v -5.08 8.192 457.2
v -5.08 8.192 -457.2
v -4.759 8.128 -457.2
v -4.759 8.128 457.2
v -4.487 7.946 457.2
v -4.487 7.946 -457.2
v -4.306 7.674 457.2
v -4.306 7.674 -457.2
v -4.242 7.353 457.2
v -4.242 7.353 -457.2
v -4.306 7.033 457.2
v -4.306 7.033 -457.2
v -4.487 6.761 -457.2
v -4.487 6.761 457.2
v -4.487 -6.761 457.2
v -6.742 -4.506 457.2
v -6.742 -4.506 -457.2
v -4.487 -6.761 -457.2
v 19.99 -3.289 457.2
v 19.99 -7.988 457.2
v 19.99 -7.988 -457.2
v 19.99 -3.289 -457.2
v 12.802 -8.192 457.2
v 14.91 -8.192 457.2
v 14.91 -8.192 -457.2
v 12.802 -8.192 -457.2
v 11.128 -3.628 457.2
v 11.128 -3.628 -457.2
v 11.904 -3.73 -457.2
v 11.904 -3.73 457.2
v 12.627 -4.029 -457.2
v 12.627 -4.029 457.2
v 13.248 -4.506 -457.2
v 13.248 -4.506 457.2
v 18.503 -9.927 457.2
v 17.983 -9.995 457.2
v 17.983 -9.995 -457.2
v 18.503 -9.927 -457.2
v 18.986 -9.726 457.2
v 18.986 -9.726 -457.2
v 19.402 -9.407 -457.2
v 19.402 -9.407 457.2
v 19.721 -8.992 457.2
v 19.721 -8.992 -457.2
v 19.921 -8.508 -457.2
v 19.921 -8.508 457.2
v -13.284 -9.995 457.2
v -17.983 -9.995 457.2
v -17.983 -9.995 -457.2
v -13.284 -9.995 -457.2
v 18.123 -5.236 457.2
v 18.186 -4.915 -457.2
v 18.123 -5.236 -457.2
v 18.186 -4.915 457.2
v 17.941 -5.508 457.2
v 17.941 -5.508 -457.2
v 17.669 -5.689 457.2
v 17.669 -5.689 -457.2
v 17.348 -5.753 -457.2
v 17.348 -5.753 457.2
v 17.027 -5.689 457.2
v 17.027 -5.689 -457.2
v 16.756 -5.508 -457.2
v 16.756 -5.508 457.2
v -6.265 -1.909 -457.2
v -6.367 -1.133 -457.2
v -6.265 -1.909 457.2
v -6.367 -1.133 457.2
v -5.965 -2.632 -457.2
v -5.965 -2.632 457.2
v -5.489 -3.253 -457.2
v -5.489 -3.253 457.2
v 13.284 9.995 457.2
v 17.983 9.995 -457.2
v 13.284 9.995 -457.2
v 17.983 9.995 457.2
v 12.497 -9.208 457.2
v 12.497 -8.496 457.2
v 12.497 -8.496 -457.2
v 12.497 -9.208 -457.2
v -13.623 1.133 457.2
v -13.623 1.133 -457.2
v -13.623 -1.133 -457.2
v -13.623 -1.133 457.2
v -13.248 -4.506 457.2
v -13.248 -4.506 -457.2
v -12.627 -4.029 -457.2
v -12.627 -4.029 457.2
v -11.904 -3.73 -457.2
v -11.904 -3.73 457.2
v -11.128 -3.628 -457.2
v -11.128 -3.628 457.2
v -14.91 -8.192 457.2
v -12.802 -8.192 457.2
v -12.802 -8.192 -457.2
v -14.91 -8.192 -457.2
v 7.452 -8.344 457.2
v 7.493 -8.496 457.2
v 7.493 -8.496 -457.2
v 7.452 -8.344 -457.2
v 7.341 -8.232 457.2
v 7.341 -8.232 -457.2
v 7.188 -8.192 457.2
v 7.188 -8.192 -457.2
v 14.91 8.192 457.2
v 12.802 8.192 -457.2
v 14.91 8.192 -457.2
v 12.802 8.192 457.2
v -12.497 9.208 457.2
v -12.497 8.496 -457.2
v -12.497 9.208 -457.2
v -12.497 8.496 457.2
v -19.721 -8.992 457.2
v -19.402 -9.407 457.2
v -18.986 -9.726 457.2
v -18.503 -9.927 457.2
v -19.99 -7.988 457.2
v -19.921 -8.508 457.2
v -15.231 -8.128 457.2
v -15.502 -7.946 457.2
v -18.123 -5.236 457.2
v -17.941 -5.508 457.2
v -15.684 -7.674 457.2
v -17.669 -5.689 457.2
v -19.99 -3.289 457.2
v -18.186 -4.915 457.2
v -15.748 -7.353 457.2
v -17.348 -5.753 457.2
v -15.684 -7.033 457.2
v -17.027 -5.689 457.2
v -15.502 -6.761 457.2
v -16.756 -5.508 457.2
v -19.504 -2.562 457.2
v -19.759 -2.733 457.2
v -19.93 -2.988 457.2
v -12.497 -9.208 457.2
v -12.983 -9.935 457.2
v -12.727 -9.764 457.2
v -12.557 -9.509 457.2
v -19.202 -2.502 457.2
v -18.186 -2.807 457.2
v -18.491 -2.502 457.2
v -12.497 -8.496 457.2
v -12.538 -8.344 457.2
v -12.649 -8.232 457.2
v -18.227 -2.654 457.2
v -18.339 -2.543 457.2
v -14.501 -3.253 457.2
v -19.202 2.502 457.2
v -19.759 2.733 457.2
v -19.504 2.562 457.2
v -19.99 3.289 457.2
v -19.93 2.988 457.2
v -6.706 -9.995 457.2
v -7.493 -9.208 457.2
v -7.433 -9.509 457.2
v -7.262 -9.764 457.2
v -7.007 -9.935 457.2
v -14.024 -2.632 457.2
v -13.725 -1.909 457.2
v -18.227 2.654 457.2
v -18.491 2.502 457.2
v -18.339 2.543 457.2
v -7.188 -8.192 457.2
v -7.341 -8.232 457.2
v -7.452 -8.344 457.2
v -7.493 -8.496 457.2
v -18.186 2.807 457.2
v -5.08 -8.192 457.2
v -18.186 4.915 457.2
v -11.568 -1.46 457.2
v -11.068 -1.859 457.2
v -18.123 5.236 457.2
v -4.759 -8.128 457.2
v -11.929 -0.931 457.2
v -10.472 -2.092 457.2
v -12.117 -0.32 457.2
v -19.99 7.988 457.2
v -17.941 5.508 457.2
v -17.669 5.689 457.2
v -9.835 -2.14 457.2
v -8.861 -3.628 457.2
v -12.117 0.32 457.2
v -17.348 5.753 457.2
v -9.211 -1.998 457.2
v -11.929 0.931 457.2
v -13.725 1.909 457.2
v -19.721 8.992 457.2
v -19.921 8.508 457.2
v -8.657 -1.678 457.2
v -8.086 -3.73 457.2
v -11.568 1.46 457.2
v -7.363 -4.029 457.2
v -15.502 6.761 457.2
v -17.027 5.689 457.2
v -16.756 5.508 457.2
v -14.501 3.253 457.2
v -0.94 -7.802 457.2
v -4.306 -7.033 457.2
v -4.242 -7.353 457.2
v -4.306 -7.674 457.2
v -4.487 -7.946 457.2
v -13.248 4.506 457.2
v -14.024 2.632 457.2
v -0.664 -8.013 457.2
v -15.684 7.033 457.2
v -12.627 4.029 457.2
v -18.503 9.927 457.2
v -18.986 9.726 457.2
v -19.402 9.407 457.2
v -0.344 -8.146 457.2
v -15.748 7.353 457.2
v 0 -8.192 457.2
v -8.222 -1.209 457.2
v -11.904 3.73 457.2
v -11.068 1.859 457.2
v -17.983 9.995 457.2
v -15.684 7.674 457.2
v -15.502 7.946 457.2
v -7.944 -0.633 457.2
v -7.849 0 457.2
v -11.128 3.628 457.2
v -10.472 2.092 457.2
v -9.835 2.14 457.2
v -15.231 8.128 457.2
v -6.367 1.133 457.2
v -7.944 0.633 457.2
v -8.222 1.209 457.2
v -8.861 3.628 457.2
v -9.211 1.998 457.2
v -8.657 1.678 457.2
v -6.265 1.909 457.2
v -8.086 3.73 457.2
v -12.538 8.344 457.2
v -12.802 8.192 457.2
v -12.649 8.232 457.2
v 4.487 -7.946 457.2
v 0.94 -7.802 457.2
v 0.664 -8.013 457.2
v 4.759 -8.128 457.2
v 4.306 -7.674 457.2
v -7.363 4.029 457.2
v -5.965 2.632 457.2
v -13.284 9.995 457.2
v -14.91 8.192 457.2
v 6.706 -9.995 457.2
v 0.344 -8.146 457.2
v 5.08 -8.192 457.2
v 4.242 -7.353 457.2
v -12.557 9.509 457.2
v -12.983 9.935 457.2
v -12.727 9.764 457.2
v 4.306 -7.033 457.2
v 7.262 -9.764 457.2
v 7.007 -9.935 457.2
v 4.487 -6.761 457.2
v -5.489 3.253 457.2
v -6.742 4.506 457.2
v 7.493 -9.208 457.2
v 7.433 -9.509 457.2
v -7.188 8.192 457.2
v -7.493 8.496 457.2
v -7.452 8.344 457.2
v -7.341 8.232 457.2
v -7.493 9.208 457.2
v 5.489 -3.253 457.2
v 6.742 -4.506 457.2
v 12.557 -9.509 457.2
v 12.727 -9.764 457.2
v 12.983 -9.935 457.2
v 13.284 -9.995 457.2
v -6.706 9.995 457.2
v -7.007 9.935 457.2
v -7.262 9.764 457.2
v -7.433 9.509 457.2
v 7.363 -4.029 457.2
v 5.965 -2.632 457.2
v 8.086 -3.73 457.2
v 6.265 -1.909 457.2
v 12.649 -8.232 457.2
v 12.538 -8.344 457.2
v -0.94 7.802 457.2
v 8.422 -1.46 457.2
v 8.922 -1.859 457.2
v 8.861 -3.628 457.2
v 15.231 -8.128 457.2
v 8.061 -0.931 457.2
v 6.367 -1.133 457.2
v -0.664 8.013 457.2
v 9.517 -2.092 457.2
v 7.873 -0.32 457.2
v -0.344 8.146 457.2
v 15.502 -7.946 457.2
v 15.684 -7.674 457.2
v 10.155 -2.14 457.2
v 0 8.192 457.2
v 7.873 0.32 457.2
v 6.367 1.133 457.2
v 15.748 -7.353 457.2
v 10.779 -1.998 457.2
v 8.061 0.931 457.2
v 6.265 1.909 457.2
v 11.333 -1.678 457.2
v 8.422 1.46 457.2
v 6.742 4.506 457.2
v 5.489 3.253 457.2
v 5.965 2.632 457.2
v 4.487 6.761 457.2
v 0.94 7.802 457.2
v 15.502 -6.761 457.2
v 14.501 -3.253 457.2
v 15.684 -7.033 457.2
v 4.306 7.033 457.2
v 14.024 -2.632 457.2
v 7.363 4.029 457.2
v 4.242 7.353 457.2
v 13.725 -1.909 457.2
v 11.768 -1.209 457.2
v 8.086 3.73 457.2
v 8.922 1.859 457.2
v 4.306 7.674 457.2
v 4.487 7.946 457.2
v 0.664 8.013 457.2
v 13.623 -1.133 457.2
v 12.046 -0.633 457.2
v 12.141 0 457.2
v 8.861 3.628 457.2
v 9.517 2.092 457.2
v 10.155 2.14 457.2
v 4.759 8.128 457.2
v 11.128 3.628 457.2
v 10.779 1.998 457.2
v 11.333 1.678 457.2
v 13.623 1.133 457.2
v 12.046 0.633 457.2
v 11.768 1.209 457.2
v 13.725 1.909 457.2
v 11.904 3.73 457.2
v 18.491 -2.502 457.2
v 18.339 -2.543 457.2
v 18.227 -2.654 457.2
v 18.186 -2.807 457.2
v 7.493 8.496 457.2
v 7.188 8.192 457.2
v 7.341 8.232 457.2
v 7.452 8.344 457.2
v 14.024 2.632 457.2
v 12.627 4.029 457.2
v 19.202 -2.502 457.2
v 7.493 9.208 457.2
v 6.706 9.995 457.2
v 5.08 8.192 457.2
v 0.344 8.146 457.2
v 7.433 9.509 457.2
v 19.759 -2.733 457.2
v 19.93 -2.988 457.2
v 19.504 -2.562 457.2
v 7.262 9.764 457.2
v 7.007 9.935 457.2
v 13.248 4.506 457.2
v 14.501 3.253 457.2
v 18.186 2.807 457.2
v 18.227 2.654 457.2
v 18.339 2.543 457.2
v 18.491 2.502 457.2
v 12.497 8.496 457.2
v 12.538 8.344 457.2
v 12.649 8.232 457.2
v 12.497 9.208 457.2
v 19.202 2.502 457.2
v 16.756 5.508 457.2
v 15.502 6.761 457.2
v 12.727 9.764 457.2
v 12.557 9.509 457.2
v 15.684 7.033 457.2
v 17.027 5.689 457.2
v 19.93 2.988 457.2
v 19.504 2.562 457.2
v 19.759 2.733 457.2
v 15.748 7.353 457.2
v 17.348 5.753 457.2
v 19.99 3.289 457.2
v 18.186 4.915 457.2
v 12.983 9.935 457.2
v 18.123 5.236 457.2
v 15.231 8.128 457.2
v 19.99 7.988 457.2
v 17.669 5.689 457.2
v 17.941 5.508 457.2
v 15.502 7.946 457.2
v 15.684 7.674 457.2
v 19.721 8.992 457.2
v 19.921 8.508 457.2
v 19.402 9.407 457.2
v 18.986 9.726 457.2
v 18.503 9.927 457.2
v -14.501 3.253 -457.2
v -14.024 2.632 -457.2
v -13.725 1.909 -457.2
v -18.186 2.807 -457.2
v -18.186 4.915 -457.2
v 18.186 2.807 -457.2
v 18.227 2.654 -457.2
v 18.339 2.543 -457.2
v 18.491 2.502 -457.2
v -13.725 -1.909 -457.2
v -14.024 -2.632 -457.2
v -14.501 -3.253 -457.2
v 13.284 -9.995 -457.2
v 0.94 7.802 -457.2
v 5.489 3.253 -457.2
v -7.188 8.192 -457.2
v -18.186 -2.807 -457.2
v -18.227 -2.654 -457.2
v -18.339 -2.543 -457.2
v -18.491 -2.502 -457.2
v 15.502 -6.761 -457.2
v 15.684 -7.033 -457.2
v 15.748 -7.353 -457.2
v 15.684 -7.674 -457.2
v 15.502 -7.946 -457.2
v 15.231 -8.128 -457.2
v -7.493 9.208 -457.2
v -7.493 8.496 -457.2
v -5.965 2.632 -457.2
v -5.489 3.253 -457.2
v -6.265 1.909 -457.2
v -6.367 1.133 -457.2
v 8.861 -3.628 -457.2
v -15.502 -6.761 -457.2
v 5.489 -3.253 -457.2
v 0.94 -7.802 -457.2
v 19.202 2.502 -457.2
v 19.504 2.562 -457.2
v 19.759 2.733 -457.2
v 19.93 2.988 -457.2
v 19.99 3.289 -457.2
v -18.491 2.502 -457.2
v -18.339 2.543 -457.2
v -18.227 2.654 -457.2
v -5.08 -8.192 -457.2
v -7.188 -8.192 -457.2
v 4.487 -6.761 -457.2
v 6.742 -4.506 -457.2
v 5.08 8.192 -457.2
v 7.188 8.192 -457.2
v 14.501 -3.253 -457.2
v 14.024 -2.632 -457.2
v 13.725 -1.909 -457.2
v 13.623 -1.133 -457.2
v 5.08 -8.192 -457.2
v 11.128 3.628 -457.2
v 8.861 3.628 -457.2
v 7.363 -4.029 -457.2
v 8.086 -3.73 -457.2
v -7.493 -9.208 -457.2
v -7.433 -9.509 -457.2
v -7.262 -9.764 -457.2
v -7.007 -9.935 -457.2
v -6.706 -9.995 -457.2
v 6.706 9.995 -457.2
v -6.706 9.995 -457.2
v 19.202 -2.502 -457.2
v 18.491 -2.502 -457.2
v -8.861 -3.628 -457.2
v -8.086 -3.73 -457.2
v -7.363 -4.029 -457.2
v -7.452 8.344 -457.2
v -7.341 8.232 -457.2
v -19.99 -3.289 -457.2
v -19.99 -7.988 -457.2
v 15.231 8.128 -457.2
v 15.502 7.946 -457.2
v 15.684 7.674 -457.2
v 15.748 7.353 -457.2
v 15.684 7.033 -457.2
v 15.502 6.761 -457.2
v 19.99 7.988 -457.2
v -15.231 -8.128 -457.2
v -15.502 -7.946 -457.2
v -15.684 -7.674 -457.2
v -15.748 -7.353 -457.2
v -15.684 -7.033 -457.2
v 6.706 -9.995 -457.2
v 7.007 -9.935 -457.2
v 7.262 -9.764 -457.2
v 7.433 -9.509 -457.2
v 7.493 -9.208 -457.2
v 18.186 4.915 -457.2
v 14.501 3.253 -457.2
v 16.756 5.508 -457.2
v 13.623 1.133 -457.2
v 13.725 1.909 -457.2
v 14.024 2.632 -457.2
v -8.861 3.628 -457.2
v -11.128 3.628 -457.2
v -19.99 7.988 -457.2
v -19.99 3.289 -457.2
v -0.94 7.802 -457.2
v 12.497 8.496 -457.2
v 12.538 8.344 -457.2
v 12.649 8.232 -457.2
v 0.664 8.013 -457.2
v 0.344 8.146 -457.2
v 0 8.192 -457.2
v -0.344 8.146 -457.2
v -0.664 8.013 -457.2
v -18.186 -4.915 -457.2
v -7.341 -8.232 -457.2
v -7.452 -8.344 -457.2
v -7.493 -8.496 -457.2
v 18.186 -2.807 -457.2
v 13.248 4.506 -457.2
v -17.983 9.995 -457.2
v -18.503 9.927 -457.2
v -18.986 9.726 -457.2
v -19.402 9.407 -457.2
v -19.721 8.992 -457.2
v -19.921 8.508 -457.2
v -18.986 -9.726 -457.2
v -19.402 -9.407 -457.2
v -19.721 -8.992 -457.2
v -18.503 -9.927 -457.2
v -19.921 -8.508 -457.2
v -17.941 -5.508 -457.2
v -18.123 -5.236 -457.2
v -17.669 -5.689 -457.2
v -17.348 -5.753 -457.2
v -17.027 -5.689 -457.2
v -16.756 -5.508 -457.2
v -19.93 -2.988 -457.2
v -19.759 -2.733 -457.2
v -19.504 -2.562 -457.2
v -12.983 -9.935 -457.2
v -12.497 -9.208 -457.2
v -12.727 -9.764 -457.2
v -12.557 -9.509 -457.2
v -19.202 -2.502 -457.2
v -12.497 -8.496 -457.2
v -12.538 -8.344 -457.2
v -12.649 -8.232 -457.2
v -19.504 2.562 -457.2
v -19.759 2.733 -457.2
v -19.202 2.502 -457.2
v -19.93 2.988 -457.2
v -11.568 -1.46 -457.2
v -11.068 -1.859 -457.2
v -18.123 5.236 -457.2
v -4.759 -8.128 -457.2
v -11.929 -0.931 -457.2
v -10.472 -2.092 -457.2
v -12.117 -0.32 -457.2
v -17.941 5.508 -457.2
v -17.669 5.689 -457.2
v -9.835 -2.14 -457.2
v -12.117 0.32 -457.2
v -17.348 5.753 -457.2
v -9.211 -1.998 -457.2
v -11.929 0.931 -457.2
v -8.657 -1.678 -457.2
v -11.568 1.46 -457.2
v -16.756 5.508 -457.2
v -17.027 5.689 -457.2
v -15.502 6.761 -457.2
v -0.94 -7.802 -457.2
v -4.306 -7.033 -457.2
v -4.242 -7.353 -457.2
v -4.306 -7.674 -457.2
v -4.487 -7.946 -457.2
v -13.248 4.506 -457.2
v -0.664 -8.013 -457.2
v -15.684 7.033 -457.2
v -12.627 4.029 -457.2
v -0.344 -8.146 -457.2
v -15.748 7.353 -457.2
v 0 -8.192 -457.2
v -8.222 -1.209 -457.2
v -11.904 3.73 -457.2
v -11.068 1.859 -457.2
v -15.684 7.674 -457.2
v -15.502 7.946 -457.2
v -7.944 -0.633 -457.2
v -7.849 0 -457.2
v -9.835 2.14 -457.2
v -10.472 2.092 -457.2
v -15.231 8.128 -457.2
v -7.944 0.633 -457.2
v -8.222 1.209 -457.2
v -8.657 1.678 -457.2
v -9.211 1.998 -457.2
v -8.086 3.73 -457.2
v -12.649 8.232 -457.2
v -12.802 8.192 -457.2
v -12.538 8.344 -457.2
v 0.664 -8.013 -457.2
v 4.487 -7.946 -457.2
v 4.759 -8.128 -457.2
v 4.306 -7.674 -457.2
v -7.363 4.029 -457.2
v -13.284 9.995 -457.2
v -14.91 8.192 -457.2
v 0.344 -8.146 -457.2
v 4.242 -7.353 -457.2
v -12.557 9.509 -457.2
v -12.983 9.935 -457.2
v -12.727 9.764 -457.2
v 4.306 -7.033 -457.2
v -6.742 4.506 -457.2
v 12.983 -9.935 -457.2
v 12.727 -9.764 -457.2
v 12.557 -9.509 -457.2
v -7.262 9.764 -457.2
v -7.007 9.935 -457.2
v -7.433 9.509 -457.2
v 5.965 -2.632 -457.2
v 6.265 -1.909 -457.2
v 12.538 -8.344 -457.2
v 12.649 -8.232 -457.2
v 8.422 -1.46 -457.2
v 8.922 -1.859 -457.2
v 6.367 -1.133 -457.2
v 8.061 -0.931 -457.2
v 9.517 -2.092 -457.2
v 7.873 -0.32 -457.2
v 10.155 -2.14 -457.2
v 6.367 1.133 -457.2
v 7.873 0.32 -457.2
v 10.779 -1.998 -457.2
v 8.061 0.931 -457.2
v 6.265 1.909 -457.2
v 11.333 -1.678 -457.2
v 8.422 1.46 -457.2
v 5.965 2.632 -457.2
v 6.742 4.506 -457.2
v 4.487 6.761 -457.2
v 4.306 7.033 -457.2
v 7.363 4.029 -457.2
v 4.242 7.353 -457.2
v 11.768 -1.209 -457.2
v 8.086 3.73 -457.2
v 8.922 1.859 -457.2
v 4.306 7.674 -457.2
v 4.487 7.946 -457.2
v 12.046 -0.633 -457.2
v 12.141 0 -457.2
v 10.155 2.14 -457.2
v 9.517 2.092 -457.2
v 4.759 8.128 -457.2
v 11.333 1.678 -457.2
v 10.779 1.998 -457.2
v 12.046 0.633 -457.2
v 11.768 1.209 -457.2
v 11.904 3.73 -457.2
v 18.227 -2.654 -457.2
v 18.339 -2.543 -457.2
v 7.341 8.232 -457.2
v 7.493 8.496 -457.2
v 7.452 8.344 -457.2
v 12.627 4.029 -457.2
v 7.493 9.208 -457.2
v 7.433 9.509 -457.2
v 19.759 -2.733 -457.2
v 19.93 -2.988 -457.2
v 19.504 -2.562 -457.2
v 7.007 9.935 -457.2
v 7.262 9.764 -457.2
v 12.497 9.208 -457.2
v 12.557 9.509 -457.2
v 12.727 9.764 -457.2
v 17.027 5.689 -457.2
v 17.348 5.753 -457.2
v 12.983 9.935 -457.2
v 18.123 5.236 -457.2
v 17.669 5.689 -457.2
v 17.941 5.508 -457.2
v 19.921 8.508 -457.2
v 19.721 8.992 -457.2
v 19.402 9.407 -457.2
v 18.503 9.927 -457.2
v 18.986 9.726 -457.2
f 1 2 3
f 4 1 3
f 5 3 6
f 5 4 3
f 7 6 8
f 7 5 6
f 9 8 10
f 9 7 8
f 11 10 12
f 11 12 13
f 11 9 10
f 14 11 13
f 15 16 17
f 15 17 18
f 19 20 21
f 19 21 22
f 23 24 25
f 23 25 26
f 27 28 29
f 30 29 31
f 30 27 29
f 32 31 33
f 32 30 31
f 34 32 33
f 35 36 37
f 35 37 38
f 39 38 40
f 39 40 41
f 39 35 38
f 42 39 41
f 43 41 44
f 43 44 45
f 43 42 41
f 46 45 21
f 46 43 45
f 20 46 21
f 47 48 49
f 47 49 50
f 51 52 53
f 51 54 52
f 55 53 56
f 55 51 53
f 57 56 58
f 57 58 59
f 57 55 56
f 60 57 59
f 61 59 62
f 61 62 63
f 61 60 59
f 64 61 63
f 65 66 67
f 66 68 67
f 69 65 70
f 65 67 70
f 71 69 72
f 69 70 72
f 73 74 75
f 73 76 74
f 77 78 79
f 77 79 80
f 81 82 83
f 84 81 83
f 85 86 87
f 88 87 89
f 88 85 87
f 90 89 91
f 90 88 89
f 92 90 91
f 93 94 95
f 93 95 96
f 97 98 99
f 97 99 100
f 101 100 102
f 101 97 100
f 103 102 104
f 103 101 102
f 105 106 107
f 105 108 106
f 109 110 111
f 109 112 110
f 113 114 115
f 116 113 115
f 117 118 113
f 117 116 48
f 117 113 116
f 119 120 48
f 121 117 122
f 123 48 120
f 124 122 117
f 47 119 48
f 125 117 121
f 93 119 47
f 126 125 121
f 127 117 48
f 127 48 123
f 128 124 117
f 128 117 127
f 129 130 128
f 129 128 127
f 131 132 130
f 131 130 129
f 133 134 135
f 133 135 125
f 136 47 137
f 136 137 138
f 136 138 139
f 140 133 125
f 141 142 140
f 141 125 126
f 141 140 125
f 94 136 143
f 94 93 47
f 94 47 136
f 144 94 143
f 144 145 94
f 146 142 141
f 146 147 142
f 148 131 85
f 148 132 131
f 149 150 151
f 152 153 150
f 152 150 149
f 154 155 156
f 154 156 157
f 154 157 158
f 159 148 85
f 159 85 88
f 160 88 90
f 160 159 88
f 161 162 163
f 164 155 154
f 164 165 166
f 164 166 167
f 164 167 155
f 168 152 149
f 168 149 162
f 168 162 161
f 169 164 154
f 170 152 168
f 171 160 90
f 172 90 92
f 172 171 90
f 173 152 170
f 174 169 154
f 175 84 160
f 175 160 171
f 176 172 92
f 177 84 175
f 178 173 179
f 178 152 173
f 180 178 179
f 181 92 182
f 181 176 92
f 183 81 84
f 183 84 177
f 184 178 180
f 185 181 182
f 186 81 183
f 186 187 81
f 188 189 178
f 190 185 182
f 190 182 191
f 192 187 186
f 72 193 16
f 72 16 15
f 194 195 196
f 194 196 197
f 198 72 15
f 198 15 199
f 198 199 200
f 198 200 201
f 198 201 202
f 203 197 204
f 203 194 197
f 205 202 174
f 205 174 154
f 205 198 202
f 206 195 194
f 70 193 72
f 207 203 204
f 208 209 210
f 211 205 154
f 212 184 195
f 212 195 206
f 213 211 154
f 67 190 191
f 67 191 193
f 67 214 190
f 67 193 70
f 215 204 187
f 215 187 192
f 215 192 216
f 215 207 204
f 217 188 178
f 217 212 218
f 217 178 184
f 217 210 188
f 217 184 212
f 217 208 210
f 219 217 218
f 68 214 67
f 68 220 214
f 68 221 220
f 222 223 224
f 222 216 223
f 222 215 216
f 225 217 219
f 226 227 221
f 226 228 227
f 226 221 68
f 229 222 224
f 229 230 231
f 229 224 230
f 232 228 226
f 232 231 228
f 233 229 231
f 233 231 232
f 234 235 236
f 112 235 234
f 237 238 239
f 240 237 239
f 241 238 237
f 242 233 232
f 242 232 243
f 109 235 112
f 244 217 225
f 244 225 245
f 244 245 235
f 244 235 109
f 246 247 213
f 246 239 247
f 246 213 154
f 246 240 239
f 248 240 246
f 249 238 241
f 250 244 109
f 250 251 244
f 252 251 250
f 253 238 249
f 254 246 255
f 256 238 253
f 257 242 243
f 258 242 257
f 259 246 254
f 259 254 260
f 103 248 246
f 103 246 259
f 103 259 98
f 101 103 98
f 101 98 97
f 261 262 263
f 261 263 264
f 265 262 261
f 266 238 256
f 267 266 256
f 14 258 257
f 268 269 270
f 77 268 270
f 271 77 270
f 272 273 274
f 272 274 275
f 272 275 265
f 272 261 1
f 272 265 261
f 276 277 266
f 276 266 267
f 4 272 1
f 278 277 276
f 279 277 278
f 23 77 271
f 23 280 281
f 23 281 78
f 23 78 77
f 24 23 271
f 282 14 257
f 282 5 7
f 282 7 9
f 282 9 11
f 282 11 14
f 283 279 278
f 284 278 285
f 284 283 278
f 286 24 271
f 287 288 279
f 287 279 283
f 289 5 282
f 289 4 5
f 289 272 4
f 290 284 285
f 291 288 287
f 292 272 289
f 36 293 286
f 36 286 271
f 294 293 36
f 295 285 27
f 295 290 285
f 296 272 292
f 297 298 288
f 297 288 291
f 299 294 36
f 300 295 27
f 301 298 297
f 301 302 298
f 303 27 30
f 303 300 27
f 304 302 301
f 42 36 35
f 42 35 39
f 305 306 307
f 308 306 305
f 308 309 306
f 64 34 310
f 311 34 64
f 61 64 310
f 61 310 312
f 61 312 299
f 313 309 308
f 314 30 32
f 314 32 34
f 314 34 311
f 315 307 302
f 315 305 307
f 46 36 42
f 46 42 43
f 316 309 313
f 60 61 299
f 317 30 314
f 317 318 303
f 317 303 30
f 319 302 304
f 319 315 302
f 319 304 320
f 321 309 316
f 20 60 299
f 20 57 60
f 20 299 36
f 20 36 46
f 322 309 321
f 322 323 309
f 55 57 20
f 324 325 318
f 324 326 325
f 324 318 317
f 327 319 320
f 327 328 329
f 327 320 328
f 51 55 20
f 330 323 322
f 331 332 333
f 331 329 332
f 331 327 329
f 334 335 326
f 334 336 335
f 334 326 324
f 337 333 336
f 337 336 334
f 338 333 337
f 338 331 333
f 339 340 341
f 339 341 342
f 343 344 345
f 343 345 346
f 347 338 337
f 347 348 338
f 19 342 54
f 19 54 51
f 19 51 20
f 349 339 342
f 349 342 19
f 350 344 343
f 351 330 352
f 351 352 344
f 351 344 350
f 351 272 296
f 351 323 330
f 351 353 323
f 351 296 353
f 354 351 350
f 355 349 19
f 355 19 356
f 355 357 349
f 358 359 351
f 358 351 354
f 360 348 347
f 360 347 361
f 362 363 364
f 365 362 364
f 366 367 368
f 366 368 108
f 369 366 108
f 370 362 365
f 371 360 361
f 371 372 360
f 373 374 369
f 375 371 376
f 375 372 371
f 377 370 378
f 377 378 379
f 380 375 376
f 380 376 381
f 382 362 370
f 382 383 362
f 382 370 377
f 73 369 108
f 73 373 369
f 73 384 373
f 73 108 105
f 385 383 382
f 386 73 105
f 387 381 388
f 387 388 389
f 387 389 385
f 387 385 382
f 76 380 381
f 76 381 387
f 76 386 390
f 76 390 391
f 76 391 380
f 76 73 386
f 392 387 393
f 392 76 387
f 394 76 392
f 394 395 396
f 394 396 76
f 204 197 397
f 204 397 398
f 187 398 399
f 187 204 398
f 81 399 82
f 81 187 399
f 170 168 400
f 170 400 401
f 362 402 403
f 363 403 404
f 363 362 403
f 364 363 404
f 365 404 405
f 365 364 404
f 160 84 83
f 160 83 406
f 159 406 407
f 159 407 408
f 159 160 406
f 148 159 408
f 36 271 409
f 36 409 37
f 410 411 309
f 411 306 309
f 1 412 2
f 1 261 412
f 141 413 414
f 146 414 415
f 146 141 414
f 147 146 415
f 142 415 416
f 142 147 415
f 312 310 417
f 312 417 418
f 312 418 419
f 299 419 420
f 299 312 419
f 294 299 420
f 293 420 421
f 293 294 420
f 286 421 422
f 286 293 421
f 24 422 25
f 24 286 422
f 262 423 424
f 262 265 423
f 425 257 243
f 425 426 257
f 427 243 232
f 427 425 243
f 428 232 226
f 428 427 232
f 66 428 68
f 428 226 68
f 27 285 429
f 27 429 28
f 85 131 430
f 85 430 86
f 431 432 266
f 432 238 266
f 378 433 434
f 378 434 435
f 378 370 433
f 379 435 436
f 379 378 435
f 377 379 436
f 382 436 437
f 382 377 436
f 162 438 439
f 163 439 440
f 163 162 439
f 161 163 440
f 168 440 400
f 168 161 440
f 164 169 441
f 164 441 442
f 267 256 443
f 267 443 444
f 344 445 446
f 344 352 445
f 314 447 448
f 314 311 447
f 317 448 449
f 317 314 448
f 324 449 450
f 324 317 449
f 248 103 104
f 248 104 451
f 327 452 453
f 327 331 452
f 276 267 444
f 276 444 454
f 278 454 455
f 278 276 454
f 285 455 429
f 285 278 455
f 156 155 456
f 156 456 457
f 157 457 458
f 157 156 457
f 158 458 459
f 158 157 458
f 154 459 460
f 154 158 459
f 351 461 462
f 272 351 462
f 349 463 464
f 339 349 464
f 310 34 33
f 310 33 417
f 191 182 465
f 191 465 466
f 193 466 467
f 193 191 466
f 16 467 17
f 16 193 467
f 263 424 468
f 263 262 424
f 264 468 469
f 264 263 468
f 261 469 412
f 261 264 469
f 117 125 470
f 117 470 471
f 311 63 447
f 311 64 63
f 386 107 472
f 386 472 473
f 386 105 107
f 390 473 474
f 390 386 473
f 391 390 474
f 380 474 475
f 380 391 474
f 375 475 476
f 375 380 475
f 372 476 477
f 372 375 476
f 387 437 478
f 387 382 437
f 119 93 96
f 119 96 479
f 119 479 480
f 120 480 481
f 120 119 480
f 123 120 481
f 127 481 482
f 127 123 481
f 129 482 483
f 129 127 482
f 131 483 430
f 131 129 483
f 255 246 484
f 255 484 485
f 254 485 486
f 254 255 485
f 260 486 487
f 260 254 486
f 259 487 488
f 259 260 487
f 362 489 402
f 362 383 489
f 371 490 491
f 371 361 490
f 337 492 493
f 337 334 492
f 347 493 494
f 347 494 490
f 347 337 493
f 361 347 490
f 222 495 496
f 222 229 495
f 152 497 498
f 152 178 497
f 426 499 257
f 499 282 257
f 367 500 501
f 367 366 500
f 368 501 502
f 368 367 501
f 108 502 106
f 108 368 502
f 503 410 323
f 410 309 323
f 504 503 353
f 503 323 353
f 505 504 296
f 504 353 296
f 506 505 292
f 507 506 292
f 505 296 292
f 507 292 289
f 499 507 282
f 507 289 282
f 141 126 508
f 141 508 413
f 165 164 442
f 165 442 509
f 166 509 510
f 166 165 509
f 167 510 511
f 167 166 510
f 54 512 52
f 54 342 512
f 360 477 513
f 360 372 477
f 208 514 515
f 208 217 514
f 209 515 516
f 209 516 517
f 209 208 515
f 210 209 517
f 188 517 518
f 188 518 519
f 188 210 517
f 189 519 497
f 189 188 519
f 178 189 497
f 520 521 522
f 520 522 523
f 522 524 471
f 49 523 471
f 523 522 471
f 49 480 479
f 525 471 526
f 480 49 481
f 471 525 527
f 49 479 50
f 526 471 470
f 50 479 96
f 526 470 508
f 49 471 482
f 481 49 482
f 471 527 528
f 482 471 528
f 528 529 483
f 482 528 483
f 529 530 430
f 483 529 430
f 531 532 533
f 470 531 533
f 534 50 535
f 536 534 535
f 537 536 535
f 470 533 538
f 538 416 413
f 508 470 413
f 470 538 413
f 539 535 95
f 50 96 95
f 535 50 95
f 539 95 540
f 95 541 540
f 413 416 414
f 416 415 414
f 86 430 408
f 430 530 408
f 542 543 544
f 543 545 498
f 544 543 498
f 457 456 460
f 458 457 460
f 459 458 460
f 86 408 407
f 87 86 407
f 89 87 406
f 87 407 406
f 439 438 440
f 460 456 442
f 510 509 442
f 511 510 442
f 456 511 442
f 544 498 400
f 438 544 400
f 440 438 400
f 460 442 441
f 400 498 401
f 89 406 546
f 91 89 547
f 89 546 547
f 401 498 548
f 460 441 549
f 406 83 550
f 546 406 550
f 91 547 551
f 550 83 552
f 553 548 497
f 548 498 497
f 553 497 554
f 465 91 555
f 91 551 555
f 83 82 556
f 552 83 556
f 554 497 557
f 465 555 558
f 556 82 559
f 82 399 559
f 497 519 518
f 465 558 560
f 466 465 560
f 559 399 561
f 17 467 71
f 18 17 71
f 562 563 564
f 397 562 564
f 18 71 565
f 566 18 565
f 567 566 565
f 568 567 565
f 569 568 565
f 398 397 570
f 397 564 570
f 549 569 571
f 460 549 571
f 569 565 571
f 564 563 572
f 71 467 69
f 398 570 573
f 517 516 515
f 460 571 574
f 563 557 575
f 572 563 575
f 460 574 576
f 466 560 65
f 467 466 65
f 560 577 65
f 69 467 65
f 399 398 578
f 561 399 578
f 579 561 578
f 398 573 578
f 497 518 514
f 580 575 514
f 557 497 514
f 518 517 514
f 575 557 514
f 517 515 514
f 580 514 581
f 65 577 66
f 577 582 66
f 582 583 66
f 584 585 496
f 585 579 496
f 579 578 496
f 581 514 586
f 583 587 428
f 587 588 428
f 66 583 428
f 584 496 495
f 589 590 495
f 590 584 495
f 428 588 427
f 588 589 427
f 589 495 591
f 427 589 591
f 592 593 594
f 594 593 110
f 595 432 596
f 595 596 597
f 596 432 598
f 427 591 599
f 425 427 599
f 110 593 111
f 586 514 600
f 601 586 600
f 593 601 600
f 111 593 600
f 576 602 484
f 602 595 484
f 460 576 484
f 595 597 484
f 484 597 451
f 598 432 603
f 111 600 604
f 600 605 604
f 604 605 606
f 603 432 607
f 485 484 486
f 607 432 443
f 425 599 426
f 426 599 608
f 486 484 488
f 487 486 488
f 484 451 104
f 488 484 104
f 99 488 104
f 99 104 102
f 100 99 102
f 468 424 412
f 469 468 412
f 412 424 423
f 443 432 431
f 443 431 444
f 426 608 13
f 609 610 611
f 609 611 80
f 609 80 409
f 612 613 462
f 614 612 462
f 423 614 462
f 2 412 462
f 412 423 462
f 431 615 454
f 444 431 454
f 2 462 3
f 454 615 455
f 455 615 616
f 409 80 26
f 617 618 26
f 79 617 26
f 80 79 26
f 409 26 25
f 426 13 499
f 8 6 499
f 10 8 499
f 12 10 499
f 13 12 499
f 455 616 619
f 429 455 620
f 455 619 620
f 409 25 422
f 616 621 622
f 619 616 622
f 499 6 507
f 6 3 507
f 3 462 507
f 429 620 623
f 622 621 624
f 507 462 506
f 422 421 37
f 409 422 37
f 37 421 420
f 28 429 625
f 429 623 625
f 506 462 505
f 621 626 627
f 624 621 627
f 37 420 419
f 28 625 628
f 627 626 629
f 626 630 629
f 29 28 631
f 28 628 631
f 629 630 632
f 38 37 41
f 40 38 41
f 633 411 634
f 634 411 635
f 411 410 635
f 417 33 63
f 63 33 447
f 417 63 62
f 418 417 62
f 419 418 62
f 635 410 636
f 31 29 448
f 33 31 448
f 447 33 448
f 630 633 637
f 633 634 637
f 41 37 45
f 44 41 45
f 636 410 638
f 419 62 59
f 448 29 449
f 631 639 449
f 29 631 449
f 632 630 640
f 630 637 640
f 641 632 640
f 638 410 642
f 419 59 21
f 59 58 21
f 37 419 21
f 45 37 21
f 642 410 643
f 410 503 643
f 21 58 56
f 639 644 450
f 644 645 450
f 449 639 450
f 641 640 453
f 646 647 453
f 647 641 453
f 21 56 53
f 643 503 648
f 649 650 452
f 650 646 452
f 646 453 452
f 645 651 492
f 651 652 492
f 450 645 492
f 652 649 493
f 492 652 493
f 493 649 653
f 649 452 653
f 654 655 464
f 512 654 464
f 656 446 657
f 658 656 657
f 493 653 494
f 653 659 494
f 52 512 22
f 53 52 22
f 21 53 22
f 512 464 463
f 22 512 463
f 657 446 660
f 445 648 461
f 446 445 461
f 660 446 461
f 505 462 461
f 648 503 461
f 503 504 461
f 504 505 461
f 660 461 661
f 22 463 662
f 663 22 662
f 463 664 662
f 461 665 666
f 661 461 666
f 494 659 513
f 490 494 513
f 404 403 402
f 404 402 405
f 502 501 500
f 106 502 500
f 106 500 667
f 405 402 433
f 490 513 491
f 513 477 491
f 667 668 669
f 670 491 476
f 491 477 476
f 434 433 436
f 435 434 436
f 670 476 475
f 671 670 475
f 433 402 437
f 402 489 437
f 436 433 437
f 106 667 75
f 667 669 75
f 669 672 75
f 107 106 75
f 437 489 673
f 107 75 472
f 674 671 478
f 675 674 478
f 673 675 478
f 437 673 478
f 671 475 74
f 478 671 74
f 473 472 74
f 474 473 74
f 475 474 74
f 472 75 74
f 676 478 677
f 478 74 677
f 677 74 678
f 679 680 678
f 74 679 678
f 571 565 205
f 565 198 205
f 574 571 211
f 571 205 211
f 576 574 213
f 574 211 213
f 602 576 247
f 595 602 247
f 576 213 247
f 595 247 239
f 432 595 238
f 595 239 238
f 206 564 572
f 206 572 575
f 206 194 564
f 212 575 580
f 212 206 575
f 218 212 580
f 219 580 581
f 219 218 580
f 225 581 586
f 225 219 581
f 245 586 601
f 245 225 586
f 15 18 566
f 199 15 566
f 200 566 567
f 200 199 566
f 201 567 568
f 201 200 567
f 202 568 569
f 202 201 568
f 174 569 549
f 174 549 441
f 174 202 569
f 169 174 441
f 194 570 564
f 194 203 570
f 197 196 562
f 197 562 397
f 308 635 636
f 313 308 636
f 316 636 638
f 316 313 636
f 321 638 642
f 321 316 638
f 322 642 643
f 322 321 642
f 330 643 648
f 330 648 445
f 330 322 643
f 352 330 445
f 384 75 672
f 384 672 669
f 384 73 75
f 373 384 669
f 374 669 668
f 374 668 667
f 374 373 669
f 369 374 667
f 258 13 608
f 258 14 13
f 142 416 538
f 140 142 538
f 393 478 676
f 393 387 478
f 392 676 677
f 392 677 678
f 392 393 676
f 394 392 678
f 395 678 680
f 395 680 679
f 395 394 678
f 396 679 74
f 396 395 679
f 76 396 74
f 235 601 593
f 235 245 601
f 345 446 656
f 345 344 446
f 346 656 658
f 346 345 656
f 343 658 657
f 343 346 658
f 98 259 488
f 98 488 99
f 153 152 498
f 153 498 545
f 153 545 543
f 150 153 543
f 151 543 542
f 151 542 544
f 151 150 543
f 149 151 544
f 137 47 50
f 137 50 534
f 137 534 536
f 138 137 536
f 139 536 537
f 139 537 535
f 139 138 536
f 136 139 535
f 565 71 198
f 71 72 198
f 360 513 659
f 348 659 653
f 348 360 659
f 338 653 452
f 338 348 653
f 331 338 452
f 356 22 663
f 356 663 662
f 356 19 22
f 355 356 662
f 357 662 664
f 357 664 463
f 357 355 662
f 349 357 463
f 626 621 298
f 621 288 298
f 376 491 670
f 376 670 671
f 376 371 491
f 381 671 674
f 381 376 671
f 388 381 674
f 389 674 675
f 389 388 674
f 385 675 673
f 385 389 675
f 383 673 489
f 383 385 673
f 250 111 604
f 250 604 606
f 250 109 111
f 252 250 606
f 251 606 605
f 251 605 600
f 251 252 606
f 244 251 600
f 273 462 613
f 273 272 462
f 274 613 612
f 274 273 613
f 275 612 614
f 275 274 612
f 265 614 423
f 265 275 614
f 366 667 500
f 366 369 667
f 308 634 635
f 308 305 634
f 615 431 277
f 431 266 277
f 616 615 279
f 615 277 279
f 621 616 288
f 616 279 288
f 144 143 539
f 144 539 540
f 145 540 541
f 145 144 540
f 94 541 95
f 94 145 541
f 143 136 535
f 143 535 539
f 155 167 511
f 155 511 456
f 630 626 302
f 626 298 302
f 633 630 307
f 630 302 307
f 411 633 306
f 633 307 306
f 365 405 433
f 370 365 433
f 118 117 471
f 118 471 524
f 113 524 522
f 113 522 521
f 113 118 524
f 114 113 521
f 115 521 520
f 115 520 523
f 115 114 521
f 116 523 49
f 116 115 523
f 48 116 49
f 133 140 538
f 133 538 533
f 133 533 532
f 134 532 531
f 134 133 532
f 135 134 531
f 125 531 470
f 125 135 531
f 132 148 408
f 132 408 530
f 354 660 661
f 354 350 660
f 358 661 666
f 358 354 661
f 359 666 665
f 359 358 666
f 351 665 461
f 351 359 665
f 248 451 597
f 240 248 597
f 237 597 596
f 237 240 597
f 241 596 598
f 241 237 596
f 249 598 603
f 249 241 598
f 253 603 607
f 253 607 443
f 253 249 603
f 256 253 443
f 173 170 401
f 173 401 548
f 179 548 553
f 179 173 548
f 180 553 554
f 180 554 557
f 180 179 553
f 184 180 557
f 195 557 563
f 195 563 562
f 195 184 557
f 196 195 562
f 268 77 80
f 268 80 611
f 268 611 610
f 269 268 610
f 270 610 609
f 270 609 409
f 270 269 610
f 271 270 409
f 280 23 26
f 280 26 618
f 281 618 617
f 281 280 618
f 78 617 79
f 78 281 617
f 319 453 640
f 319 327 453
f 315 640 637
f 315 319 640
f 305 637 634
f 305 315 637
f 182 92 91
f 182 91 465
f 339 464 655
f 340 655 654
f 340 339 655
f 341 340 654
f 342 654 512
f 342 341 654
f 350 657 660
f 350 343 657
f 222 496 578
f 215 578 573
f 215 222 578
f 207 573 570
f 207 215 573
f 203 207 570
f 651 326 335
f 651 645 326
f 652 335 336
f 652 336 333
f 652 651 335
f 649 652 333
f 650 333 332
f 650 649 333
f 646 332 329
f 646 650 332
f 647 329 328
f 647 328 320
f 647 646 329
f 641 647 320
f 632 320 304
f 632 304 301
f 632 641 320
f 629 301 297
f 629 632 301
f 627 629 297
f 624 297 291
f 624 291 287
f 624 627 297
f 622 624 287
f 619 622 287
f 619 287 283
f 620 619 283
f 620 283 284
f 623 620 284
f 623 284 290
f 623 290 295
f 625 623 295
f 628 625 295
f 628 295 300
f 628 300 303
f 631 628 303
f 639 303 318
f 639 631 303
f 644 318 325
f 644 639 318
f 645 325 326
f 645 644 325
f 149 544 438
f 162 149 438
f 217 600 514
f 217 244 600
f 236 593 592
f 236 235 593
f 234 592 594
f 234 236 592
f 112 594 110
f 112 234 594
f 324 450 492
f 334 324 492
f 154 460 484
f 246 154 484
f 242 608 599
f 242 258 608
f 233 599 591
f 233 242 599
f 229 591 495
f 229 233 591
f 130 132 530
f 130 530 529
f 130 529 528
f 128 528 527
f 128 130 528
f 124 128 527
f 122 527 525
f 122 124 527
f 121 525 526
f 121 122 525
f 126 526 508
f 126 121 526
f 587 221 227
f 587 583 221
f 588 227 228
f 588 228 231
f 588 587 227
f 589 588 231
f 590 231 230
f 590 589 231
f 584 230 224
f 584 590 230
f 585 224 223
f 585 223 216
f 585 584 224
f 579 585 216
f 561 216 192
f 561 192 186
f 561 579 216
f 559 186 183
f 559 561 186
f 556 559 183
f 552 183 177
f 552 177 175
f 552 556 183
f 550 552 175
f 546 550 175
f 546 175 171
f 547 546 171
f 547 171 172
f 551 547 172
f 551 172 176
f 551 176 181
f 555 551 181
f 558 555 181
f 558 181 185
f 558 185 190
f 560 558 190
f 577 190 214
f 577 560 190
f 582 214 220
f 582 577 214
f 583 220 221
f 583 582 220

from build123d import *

# Parameters (mm, degrees)
SKETCH1_R           = 2.1463
BOSS_EXTRUDE1_DEPTH = 457.2


with BuildPart() as part:
    # Sketch1 → Boss-Extrude1 (new body, symmetric)
    with BuildSketch(Plane.XY):
        with BuildLine():
            Line((-19.9898, 7.9883), (-19.9898, 3.2893))
            ThreePointArc((-19.9898, 3.2893), (-19.75917588, 2.73252412), (-19.2024, 2.5019))
            Line((-19.2024, 2.5019), (-18.4912, 2.5019))
            ThreePointArc((-18.4912, 2.5019), (-18.275673853, 2.591173853), (-18.1864, 2.8067))
            Line((-18.1864, 2.8067), (-18.1864, 4.9149))
            ThreePointArc((-18.1864, 4.9149), (-17.668965253, 5.689295824), (-16.755503096, 5.507596904))
            Line((-16.755503096, 5.507596904), (-14.500665747, 3.252759555))
            ThreePointArc((-14.500665747, 3.252759555), (-13.850954457, 2.280397894), (-13.622806192, 1.133419111))
            Line((-13.622806192, 1.133419111), (-13.622806192, -1.133419111))
            ThreePointArc((-13.622806192, -1.133419111), (-13.850954457, -2.280397894), (-14.500665747, -3.252759555))
            Line((-14.500665747, -3.252759555), (-16.755503096, -5.507596904))
            ThreePointArc((-16.755503096, -5.507596904), (-17.668965253, -5.689295824), (-18.1864, -4.9149))
            Line((-18.1864, -4.9149), (-18.1864, -2.8067))
            ThreePointArc((-18.1864, -2.8067), (-18.275673853, -2.591173853), (-18.4912, -2.5019))
            Line((-18.4912, -2.5019), (-19.2024, -2.5019))
            ThreePointArc((-19.2024, -2.5019), (-19.75917588, -2.73252412), (-19.9898, -3.2893))
            Line((-19.9898, -3.2893), (-19.9898, -7.9883))
            ThreePointArc((-19.9898, -7.9883), (-19.402080467, -9.407180467), (-17.9832, -9.9949))
            Line((-17.9832, -9.9949), (-13.2842, -9.9949))
            ThreePointArc((-13.2842, -9.9949), (-12.72742412, -9.76427588), (-12.4968, -9.2075))
            Line((-12.4968, -9.2075), (-12.4968, -8.4963))
            ThreePointArc((-12.4968, -8.4963), (-12.586073853, -8.280773853), (-12.8016, -8.1915))
            Line((-12.8016, -8.1915), (-14.9098, -8.1915))
            ThreePointArc((-14.9098, -8.1915), (-15.684195824, -7.674065253), (-15.502496904, -6.760603096))
            Line((-15.502496904, -6.760603096), (-13.247659555, -4.505765747))
            ThreePointArc((-13.247659555, -4.505765747), (-12.275297894, -3.856054457), (-11.128319111, -3.627906192))
            Line((-11.128319111, -3.627906192), (-8.861480889, -3.627906192))
            ThreePointArc((-8.861480889, -3.627906192), (-7.714502106, -3.856054457), (-6.742140445, -4.505765747))
            Line((-6.742140445, -4.505765747), (-4.487303096, -6.760603096))
            ThreePointArc((-4.487303096, -6.760603096), (-4.305604176, -7.674065253), (-5.08, -8.1915))
            Line((-5.08, -8.1915), (-7.1882, -8.1915))
            ThreePointArc((-7.1882, -8.1915), (-7.403726147, -8.280773853), (-7.493, -8.4963))
            Line((-7.493, -8.4963), (-7.493, -9.2075))
            ThreePointArc((-7.493, -9.2075), (-7.26237588, -9.76427588), (-6.7056, -9.9949))
            Line((-6.7056, -9.9949), (0, -9.9949))
            Line((0, -9.9949), (6.7056, -9.9949))
            ThreePointArc((6.7056, -9.9949), (7.26237588, -9.76427588), (7.493, -9.2075))
            Line((7.493, -9.2075), (7.493, -8.4963))
            ThreePointArc((7.493, -8.4963), (7.403726147, -8.280773853), (7.1882, -8.1915))
            Line((7.1882, -8.1915), (5.08, -8.1915))
            ThreePointArc((5.08, -8.1915), (4.305604176, -7.674065253), (4.487303096, -6.760603096))
            Line((4.487303096, -6.760603096), (6.742140445, -4.505765747))
            ThreePointArc((6.742140445, -4.505765747), (7.714502106, -3.856054457), (8.861480889, -3.627906192))
            Line((8.861480889, -3.627906192), (11.128319111, -3.627906192))
            ThreePointArc((11.128319111, -3.627906192), (12.275297894, -3.856054457), (13.247659555, -4.505765747))
            Line((13.247659555, -4.505765747), (15.502496904, -6.760603096))
            ThreePointArc((15.502496904, -6.760603096), (15.684195824, -7.674065253), (14.9098, -8.1915))
            Line((14.9098, -8.1915), (12.8016, -8.1915))
            ThreePointArc((12.8016, -8.1915), (12.586073853, -8.280773853), (12.4968, -8.4963))
            Line((12.4968, -8.4963), (12.4968, -9.2075))
            ThreePointArc((12.4968, -9.2075), (12.72742412, -9.76427588), (13.2842, -9.9949))
            Line((13.2842, -9.9949), (17.9832, -9.9949))
            ThreePointArc((17.9832, -9.9949), (19.402080467, -9.407180467), (19.9898, -7.9883))
            Line((19.9898, -7.9883), (19.9898, -3.2893))
            ThreePointArc((19.9898, -3.2893), (19.75917588, -2.73252412), (19.2024, -2.5019))
            Line((19.2024, -2.5019), (18.4912, -2.5019))
            ThreePointArc((18.4912, -2.5019), (18.275673853, -2.591173853), (18.1864, -2.8067))
            Line((18.1864, -2.8067), (18.1864, -4.9149))
            ThreePointArc((18.1864, -4.9149), (17.668965253, -5.689295824), (16.755503096, -5.507596904))
            Line((16.755503096, -5.507596904), (14.500665747, -3.252759555))
            ThreePointArc((14.500665747, -3.252759555), (13.850954457, -2.280397894), (13.622806192, -1.133419111))
            Line((13.622806192, -1.133419111), (13.622806192, 1.133419111))
            ThreePointArc((13.622806192, 1.133419111), (13.850954457, 2.280397894), (14.500665747, 3.252759555))
            Line((14.500665747, 3.252759555), (16.755503096, 5.507596904))
            ThreePointArc((16.755503096, 5.507596904), (17.668965253, 5.689295824), (18.1864, 4.9149))
            Line((18.1864, 4.9149), (18.1864, 2.8067))
            ThreePointArc((18.1864, 2.8067), (18.275673853, 2.591173853), (18.4912, 2.5019))
            Line((18.4912, 2.5019), (19.2024, 2.5019))
            ThreePointArc((19.2024, 2.5019), (19.75917588, 2.73252412), (19.9898, 3.2893))
            Line((19.9898, 3.2893), (19.9898, 7.9883))
            ThreePointArc((19.9898, 7.9883), (19.402080467, 9.407180467), (17.9832, 9.9949))
            Line((17.9832, 9.9949), (13.2842, 9.9949))
            ThreePointArc((13.2842, 9.9949), (12.72742412, 9.76427588), (12.4968, 9.2075))
            Line((12.4968, 9.2075), (12.4968, 8.4963))
            ThreePointArc((12.4968, 8.4963), (12.586073853, 8.280773853), (12.8016, 8.1915))
            Line((12.8016, 8.1915), (14.9098, 8.1915))
            ThreePointArc((14.9098, 8.1915), (15.684195824, 7.674065253), (15.502496904, 6.760603096))
            Line((15.502496904, 6.760603096), (13.247659555, 4.505765747))
            ThreePointArc((13.247659555, 4.505765747), (12.275297894, 3.856054457), (11.128319111, 3.627906192))
            Line((11.128319111, 3.627906192), (8.861480889, 3.627906192))
            ThreePointArc((8.861480889, 3.627906192), (7.714502106, 3.856054457), (6.742140445, 4.505765747))
            Line((6.742140445, 4.505765747), (4.487303096, 6.760603096))
            ThreePointArc((4.487303096, 6.760603096), (4.305604176, 7.674065253), (5.08, 8.1915))
            Line((5.08, 8.1915), (7.1882, 8.1915))
            ThreePointArc((7.1882, 8.1915), (7.403726147, 8.280773853), (7.493, 8.4963))
            Line((7.493, 8.4963), (7.493, 9.2075))
            ThreePointArc((7.493, 9.2075), (7.26237588, 9.76427588), (6.7056, 9.9949))
            Line((6.7056, 9.9949), (0, 9.9949))
            Line((0, 9.9949), (-6.7056, 9.9949))
            ThreePointArc((-6.7056, 9.9949), (-7.26237588, 9.76427588), (-7.493, 9.2075))
            Line((-7.493, 9.2075), (-7.493, 8.4963))
            ThreePointArc((-7.493, 8.4963), (-7.403726147, 8.280773853), (-7.1882, 8.1915))
            Line((-7.1882, 8.1915), (-5.08, 8.1915))
            ThreePointArc((-5.08, 8.1915), (-4.305604176, 7.674065253), (-4.487303096, 6.760603096))
            Line((-4.487303096, 6.760603096), (-6.742140445, 4.505765747))
            ThreePointArc((-6.742140445, 4.505765747), (-7.714502106, 3.856054457), (-8.861480889, 3.627906192))
            Line((-8.861480889, 3.627906192), (-11.128319111, 3.627906192))
            ThreePointArc((-11.128319111, 3.627906192), (-12.275297894, 3.856054457), (-13.247659555, 4.505765747))
            Line((-13.247659555, 4.505765747), (-15.502496904, 6.760603096))
            ThreePointArc((-15.502496904, 6.760603096), (-15.684195824, 7.674065253), (-14.9098, 8.1915))
            Line((-14.9098, 8.1915), (-12.8016, 8.1915))
            ThreePointArc((-12.8016, 8.1915), (-12.586073853, 8.280773853), (-12.4968, 8.4963))
            Line((-12.4968, 8.4963), (-12.4968, 9.2075))
            ThreePointArc((-12.4968, 9.2075), (-12.72742412, 9.76427588), (-13.2842, 9.9949))
            Line((-13.2842, 9.9949), (-17.9832, 9.9949))
            ThreePointArc((-17.9832, 9.9949), (-19.402080467, 9.407180467), (-19.9898, 7.9883))
        make_face()
        with Locations((-9.9949, 0)):
            Circle(SKETCH1_R, mode=Mode.SUBTRACT)
        with Locations((9.9949, 0)):
            Circle(SKETCH1_R, mode=Mode.SUBTRACT)
        with BuildLine():
            Line((-6.366993808, 1.133419111), (-6.366993808, -1.133419111))
            ThreePointArc((-6.366993808, -1.133419111), (-6.138845543, -2.280397894), (-5.489134253, -3.252759555))
            Line((-5.489134253, -3.252759555), (-0.939581002, -7.802312806))
            ThreePointArc((-0.939581002, -7.802312806), (0, -8.1915), (0.939581002, -7.802312806))
            Line((0.939581002, -7.802312806), (5.489134253, -3.252759555))
            ThreePointArc((5.489134253, -3.252759555), (6.138845543, -2.280397894), (6.366993808, -1.133419111))
            Line((6.366993808, -1.133419111), (6.366993808, 1.133419111))
            ThreePointArc((6.366993808, 1.133419111), (6.138845543, 2.280397894), (5.489134253, 3.252759555))
            Line((5.489134253, 3.252759555), (0.939581002, 7.802312806))
            ThreePointArc((0.939581002, 7.802312806), (0, 8.1915), (-0.939581002, 7.802312806))
            Line((-0.939581002, 7.802312806), (-5.489134253, 3.252759555))
            ThreePointArc((-5.489134253, 3.252759555), (-6.138845543, 2.280397894), (-6.366993808, 1.133419111))
        make_face(mode=Mode.SUBTRACT)
    extrude(amount=BOSS_EXTRUDE1_DEPTH, both=True)


solid = part.part
